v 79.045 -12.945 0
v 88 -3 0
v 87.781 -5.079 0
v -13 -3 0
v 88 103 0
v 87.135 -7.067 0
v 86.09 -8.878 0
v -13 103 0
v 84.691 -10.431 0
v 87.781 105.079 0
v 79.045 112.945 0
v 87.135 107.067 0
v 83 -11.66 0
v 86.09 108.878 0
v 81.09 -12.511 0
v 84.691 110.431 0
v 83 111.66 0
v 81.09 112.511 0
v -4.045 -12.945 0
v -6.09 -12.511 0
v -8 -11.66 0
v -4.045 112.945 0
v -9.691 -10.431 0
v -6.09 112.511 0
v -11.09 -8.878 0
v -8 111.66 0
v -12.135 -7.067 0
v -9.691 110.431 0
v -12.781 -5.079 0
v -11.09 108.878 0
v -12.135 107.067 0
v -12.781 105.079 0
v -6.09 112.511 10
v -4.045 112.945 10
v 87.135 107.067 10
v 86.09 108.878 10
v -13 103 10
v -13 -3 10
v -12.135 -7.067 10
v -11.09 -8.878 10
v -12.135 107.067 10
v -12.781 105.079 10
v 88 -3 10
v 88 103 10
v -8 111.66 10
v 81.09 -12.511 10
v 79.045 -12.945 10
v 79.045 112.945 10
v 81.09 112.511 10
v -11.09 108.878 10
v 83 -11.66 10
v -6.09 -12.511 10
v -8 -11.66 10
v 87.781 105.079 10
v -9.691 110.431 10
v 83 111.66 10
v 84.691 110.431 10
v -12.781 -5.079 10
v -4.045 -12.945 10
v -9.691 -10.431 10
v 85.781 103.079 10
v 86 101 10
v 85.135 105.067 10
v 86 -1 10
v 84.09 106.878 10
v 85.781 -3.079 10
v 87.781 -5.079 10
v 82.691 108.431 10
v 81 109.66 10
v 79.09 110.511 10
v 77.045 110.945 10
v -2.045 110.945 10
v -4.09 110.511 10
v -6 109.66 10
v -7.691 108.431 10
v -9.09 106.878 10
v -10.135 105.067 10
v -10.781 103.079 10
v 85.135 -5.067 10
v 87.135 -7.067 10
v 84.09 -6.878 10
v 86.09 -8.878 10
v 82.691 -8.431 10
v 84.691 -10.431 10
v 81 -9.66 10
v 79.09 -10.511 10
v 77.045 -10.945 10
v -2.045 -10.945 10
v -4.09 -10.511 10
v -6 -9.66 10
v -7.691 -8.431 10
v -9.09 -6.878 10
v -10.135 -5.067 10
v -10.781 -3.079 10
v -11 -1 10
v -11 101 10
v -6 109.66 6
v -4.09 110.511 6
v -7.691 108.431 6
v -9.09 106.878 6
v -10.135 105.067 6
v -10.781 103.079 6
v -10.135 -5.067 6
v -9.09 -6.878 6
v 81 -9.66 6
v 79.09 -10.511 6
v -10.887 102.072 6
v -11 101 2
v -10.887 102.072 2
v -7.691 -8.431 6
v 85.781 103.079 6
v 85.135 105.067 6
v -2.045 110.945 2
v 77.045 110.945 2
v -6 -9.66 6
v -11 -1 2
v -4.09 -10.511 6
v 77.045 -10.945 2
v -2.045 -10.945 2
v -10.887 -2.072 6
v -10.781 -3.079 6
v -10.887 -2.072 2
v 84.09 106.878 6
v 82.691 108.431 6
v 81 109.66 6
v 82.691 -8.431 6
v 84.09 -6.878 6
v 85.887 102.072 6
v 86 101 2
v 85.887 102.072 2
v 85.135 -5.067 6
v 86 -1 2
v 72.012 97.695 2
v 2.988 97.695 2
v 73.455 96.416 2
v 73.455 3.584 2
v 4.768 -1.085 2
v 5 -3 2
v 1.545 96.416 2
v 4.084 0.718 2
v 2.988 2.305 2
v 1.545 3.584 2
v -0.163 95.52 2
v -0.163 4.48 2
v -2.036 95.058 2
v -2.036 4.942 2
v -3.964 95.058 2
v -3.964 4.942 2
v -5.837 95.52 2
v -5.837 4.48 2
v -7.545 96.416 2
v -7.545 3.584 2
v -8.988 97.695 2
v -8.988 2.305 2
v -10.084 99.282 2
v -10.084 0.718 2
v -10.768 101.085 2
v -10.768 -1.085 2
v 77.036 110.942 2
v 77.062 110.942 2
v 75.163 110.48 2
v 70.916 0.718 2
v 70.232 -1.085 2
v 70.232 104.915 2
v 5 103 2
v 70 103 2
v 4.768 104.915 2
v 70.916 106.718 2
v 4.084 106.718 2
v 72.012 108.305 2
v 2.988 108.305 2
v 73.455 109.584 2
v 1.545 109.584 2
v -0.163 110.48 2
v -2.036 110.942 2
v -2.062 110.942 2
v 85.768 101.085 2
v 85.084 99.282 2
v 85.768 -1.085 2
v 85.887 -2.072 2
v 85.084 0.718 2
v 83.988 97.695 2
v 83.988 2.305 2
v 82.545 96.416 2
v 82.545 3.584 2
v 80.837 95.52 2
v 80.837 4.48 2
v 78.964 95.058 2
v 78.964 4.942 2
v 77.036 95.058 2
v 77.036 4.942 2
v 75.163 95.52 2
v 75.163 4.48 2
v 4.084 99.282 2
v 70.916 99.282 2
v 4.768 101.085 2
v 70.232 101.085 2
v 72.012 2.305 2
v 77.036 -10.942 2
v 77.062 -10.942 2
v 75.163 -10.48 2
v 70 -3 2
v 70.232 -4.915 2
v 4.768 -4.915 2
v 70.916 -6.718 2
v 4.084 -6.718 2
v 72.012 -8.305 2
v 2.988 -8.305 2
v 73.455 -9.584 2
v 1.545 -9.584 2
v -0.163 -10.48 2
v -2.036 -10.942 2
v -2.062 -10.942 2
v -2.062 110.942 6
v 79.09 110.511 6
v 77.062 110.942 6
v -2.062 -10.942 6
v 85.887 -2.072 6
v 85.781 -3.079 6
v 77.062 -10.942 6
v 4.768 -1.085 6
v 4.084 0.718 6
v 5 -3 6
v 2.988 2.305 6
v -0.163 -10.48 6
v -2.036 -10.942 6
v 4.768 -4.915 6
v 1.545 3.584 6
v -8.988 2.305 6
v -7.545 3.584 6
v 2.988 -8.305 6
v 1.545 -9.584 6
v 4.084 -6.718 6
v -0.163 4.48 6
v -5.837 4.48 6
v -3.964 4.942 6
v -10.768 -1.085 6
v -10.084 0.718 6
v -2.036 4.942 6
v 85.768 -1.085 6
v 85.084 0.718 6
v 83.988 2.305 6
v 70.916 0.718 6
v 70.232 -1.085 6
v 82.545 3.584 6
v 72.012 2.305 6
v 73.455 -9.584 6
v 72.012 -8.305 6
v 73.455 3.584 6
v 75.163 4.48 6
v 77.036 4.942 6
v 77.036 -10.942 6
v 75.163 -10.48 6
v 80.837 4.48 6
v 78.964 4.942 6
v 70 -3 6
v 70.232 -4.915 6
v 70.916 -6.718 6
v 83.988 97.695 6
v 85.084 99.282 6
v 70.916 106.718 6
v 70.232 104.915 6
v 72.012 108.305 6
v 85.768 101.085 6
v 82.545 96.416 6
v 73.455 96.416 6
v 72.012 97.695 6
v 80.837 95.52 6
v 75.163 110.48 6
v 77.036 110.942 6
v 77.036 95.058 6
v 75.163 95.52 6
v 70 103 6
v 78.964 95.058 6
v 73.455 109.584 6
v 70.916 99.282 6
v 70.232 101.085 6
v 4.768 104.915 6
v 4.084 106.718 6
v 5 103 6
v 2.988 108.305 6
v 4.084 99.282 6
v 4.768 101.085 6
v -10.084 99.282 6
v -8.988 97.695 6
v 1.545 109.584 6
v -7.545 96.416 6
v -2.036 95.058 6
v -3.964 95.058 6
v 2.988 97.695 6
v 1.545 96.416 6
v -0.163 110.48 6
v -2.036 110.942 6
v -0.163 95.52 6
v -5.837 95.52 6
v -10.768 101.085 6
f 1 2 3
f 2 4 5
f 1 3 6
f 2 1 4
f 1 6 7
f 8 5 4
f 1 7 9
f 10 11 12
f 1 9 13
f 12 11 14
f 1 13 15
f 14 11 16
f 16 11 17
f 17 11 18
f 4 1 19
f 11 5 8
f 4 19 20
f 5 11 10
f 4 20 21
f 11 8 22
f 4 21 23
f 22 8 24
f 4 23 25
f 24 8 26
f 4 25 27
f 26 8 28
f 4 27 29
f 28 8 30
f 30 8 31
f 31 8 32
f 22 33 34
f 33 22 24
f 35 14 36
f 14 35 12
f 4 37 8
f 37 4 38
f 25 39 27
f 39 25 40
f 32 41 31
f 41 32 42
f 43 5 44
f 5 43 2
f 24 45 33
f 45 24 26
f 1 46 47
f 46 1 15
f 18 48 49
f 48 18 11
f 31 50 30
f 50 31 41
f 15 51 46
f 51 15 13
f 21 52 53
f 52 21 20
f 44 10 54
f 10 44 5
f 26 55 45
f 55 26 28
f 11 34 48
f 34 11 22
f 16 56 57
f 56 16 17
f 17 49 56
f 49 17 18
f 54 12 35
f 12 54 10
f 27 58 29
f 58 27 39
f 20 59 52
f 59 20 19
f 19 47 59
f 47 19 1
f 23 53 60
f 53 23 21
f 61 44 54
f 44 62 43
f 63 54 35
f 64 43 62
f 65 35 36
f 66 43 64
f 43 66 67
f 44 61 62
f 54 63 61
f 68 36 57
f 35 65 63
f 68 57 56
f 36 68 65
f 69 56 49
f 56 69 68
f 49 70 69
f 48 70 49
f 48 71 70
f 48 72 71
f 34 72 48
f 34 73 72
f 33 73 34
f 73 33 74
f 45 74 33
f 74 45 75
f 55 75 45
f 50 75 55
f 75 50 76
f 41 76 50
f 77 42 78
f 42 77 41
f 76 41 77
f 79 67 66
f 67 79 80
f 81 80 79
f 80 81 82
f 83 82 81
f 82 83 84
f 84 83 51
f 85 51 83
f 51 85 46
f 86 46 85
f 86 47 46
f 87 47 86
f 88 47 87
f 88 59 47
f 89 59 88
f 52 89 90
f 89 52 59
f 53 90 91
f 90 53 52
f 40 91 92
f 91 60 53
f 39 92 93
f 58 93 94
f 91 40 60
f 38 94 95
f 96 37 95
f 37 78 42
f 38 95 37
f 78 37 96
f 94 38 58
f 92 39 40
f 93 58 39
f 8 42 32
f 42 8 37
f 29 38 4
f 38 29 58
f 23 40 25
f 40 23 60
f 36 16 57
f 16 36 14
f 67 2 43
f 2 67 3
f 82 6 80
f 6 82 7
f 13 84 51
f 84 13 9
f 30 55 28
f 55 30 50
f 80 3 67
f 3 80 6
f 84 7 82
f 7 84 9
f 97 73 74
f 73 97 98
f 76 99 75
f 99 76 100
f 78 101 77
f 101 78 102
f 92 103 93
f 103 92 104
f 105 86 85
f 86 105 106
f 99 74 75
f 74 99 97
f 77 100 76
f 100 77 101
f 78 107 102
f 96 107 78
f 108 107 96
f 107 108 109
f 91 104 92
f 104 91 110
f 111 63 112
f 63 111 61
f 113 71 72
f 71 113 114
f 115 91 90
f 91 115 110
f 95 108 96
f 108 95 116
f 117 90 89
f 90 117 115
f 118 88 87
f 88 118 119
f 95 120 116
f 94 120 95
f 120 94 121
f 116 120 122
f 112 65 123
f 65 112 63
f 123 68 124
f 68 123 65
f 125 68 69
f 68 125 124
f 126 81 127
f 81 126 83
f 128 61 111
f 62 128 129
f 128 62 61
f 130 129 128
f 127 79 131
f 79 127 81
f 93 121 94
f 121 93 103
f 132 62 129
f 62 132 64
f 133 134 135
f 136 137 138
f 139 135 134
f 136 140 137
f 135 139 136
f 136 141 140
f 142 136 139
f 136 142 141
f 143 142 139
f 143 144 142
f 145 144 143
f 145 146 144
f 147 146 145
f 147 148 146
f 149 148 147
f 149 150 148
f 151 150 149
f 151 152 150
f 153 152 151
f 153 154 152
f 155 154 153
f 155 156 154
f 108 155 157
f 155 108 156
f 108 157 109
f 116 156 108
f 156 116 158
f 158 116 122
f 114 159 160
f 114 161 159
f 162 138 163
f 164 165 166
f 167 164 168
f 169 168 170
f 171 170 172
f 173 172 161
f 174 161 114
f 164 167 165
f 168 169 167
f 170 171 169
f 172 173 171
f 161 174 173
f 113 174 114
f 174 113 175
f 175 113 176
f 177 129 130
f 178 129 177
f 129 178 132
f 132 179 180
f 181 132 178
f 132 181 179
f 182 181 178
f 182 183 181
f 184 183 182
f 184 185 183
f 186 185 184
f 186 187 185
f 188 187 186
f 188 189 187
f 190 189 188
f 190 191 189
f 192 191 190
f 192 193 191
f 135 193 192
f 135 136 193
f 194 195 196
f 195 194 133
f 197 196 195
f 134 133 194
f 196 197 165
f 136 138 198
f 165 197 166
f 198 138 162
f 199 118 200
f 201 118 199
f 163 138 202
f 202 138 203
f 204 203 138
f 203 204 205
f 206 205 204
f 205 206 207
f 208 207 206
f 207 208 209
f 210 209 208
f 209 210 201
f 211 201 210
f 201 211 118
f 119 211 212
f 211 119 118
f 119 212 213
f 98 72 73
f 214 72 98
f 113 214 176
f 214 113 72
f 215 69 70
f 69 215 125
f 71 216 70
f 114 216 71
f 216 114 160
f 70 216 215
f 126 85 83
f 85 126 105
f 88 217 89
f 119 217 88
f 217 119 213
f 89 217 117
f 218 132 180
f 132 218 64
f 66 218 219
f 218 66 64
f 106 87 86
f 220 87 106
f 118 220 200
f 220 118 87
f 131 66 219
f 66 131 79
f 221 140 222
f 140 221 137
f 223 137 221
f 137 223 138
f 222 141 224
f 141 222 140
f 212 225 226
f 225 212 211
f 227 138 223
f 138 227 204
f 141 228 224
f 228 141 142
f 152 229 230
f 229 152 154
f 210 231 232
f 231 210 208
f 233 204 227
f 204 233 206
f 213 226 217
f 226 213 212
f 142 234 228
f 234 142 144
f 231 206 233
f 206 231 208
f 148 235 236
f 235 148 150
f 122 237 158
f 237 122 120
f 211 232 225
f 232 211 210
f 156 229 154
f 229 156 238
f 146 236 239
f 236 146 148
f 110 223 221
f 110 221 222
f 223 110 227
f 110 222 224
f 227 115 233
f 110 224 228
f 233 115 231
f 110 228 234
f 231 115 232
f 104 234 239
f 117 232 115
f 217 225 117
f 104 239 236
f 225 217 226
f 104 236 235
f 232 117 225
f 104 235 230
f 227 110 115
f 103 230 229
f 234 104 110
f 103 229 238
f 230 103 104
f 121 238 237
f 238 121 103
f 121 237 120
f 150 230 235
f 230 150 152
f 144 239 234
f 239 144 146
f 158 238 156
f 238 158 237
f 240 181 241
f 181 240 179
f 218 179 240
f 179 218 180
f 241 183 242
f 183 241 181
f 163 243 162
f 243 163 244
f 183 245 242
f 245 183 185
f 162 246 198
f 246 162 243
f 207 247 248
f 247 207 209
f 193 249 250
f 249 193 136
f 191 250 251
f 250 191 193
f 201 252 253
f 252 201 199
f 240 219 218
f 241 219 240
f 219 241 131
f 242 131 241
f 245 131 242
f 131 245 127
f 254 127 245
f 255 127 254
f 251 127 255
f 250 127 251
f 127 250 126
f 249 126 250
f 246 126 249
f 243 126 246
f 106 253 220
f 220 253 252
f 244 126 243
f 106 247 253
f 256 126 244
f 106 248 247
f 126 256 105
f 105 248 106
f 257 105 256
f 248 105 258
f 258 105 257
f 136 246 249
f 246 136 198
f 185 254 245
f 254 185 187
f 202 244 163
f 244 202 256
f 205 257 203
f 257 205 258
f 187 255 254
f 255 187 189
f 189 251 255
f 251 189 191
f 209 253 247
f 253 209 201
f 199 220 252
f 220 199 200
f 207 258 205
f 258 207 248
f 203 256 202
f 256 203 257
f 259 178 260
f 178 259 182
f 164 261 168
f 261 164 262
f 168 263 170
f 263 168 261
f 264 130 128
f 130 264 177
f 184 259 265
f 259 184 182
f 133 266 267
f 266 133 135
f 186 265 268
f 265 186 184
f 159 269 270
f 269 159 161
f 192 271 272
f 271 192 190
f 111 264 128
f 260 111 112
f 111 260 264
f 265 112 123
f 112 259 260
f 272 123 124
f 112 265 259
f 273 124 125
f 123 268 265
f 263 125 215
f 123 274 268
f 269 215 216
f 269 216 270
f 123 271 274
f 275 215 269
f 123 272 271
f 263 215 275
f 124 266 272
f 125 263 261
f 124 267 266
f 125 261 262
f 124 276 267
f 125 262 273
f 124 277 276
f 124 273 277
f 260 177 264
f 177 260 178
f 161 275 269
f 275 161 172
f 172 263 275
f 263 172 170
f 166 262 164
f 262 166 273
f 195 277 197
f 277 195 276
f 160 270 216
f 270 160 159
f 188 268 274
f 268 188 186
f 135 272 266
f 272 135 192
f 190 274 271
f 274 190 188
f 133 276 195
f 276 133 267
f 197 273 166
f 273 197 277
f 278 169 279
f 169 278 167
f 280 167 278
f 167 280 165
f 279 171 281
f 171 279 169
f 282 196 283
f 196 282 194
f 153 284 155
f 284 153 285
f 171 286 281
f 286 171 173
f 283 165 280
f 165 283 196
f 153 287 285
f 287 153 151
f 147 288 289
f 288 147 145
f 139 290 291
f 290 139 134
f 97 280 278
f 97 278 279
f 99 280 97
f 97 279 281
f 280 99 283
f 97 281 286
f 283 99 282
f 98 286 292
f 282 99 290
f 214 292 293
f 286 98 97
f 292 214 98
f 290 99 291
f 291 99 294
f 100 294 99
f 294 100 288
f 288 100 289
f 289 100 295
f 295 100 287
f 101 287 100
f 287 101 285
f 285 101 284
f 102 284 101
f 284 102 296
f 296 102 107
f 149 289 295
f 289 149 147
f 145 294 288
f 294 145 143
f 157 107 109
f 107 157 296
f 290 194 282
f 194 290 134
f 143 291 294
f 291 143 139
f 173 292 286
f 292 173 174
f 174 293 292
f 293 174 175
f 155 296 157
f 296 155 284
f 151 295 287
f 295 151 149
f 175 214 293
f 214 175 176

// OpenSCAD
width = 75;
depth = 100;
height=10;
wallThickness = 2;

difference() {

    hull() {
        translate([-1-wallThickness,-1-wallThickness,0]) cylinder(r=10, h=height);
        translate([width +1 + wallThickness , -1- wallThickness, 0]) cylinder(r=10, h=height);
        translate([width +1 + wallThickness ,depth+1+wallThickness,0]) cylinder(r=10, h=height);
        translate([-1-wallThickness,depth+1+wallThickness,0]) cylinder(r=10, h=height);
    }

    hull() {
        translate([-1,-1,wallThickness]) cylinder(r=10, h=height);
        translate([width +1 , -1, wallThickness]) cylinder(r=10, h=height);
        translate([width +1 ,depth+1,wallThickness]) cylinder(r=10, h=height);
        translate([-1,depth+1,wallThickness]) cylinder(r=10, h=height);
    }

}

union() {
    translate([-1-wallThickness,-1-wallThickness,0]) cylinder(r=8, h=6);
    translate([width +1 + wallThickness , -1- wallThickness, 0]) cylinder(r=8, h=6);
    translate([width +1 + wallThickness ,depth+1+wallThickness,0]) cylinder(r=8, h=6);
    translate([-1-wallThickness,depth+1+wallThickness,0]) cylinder(r=8, h=6);
}
